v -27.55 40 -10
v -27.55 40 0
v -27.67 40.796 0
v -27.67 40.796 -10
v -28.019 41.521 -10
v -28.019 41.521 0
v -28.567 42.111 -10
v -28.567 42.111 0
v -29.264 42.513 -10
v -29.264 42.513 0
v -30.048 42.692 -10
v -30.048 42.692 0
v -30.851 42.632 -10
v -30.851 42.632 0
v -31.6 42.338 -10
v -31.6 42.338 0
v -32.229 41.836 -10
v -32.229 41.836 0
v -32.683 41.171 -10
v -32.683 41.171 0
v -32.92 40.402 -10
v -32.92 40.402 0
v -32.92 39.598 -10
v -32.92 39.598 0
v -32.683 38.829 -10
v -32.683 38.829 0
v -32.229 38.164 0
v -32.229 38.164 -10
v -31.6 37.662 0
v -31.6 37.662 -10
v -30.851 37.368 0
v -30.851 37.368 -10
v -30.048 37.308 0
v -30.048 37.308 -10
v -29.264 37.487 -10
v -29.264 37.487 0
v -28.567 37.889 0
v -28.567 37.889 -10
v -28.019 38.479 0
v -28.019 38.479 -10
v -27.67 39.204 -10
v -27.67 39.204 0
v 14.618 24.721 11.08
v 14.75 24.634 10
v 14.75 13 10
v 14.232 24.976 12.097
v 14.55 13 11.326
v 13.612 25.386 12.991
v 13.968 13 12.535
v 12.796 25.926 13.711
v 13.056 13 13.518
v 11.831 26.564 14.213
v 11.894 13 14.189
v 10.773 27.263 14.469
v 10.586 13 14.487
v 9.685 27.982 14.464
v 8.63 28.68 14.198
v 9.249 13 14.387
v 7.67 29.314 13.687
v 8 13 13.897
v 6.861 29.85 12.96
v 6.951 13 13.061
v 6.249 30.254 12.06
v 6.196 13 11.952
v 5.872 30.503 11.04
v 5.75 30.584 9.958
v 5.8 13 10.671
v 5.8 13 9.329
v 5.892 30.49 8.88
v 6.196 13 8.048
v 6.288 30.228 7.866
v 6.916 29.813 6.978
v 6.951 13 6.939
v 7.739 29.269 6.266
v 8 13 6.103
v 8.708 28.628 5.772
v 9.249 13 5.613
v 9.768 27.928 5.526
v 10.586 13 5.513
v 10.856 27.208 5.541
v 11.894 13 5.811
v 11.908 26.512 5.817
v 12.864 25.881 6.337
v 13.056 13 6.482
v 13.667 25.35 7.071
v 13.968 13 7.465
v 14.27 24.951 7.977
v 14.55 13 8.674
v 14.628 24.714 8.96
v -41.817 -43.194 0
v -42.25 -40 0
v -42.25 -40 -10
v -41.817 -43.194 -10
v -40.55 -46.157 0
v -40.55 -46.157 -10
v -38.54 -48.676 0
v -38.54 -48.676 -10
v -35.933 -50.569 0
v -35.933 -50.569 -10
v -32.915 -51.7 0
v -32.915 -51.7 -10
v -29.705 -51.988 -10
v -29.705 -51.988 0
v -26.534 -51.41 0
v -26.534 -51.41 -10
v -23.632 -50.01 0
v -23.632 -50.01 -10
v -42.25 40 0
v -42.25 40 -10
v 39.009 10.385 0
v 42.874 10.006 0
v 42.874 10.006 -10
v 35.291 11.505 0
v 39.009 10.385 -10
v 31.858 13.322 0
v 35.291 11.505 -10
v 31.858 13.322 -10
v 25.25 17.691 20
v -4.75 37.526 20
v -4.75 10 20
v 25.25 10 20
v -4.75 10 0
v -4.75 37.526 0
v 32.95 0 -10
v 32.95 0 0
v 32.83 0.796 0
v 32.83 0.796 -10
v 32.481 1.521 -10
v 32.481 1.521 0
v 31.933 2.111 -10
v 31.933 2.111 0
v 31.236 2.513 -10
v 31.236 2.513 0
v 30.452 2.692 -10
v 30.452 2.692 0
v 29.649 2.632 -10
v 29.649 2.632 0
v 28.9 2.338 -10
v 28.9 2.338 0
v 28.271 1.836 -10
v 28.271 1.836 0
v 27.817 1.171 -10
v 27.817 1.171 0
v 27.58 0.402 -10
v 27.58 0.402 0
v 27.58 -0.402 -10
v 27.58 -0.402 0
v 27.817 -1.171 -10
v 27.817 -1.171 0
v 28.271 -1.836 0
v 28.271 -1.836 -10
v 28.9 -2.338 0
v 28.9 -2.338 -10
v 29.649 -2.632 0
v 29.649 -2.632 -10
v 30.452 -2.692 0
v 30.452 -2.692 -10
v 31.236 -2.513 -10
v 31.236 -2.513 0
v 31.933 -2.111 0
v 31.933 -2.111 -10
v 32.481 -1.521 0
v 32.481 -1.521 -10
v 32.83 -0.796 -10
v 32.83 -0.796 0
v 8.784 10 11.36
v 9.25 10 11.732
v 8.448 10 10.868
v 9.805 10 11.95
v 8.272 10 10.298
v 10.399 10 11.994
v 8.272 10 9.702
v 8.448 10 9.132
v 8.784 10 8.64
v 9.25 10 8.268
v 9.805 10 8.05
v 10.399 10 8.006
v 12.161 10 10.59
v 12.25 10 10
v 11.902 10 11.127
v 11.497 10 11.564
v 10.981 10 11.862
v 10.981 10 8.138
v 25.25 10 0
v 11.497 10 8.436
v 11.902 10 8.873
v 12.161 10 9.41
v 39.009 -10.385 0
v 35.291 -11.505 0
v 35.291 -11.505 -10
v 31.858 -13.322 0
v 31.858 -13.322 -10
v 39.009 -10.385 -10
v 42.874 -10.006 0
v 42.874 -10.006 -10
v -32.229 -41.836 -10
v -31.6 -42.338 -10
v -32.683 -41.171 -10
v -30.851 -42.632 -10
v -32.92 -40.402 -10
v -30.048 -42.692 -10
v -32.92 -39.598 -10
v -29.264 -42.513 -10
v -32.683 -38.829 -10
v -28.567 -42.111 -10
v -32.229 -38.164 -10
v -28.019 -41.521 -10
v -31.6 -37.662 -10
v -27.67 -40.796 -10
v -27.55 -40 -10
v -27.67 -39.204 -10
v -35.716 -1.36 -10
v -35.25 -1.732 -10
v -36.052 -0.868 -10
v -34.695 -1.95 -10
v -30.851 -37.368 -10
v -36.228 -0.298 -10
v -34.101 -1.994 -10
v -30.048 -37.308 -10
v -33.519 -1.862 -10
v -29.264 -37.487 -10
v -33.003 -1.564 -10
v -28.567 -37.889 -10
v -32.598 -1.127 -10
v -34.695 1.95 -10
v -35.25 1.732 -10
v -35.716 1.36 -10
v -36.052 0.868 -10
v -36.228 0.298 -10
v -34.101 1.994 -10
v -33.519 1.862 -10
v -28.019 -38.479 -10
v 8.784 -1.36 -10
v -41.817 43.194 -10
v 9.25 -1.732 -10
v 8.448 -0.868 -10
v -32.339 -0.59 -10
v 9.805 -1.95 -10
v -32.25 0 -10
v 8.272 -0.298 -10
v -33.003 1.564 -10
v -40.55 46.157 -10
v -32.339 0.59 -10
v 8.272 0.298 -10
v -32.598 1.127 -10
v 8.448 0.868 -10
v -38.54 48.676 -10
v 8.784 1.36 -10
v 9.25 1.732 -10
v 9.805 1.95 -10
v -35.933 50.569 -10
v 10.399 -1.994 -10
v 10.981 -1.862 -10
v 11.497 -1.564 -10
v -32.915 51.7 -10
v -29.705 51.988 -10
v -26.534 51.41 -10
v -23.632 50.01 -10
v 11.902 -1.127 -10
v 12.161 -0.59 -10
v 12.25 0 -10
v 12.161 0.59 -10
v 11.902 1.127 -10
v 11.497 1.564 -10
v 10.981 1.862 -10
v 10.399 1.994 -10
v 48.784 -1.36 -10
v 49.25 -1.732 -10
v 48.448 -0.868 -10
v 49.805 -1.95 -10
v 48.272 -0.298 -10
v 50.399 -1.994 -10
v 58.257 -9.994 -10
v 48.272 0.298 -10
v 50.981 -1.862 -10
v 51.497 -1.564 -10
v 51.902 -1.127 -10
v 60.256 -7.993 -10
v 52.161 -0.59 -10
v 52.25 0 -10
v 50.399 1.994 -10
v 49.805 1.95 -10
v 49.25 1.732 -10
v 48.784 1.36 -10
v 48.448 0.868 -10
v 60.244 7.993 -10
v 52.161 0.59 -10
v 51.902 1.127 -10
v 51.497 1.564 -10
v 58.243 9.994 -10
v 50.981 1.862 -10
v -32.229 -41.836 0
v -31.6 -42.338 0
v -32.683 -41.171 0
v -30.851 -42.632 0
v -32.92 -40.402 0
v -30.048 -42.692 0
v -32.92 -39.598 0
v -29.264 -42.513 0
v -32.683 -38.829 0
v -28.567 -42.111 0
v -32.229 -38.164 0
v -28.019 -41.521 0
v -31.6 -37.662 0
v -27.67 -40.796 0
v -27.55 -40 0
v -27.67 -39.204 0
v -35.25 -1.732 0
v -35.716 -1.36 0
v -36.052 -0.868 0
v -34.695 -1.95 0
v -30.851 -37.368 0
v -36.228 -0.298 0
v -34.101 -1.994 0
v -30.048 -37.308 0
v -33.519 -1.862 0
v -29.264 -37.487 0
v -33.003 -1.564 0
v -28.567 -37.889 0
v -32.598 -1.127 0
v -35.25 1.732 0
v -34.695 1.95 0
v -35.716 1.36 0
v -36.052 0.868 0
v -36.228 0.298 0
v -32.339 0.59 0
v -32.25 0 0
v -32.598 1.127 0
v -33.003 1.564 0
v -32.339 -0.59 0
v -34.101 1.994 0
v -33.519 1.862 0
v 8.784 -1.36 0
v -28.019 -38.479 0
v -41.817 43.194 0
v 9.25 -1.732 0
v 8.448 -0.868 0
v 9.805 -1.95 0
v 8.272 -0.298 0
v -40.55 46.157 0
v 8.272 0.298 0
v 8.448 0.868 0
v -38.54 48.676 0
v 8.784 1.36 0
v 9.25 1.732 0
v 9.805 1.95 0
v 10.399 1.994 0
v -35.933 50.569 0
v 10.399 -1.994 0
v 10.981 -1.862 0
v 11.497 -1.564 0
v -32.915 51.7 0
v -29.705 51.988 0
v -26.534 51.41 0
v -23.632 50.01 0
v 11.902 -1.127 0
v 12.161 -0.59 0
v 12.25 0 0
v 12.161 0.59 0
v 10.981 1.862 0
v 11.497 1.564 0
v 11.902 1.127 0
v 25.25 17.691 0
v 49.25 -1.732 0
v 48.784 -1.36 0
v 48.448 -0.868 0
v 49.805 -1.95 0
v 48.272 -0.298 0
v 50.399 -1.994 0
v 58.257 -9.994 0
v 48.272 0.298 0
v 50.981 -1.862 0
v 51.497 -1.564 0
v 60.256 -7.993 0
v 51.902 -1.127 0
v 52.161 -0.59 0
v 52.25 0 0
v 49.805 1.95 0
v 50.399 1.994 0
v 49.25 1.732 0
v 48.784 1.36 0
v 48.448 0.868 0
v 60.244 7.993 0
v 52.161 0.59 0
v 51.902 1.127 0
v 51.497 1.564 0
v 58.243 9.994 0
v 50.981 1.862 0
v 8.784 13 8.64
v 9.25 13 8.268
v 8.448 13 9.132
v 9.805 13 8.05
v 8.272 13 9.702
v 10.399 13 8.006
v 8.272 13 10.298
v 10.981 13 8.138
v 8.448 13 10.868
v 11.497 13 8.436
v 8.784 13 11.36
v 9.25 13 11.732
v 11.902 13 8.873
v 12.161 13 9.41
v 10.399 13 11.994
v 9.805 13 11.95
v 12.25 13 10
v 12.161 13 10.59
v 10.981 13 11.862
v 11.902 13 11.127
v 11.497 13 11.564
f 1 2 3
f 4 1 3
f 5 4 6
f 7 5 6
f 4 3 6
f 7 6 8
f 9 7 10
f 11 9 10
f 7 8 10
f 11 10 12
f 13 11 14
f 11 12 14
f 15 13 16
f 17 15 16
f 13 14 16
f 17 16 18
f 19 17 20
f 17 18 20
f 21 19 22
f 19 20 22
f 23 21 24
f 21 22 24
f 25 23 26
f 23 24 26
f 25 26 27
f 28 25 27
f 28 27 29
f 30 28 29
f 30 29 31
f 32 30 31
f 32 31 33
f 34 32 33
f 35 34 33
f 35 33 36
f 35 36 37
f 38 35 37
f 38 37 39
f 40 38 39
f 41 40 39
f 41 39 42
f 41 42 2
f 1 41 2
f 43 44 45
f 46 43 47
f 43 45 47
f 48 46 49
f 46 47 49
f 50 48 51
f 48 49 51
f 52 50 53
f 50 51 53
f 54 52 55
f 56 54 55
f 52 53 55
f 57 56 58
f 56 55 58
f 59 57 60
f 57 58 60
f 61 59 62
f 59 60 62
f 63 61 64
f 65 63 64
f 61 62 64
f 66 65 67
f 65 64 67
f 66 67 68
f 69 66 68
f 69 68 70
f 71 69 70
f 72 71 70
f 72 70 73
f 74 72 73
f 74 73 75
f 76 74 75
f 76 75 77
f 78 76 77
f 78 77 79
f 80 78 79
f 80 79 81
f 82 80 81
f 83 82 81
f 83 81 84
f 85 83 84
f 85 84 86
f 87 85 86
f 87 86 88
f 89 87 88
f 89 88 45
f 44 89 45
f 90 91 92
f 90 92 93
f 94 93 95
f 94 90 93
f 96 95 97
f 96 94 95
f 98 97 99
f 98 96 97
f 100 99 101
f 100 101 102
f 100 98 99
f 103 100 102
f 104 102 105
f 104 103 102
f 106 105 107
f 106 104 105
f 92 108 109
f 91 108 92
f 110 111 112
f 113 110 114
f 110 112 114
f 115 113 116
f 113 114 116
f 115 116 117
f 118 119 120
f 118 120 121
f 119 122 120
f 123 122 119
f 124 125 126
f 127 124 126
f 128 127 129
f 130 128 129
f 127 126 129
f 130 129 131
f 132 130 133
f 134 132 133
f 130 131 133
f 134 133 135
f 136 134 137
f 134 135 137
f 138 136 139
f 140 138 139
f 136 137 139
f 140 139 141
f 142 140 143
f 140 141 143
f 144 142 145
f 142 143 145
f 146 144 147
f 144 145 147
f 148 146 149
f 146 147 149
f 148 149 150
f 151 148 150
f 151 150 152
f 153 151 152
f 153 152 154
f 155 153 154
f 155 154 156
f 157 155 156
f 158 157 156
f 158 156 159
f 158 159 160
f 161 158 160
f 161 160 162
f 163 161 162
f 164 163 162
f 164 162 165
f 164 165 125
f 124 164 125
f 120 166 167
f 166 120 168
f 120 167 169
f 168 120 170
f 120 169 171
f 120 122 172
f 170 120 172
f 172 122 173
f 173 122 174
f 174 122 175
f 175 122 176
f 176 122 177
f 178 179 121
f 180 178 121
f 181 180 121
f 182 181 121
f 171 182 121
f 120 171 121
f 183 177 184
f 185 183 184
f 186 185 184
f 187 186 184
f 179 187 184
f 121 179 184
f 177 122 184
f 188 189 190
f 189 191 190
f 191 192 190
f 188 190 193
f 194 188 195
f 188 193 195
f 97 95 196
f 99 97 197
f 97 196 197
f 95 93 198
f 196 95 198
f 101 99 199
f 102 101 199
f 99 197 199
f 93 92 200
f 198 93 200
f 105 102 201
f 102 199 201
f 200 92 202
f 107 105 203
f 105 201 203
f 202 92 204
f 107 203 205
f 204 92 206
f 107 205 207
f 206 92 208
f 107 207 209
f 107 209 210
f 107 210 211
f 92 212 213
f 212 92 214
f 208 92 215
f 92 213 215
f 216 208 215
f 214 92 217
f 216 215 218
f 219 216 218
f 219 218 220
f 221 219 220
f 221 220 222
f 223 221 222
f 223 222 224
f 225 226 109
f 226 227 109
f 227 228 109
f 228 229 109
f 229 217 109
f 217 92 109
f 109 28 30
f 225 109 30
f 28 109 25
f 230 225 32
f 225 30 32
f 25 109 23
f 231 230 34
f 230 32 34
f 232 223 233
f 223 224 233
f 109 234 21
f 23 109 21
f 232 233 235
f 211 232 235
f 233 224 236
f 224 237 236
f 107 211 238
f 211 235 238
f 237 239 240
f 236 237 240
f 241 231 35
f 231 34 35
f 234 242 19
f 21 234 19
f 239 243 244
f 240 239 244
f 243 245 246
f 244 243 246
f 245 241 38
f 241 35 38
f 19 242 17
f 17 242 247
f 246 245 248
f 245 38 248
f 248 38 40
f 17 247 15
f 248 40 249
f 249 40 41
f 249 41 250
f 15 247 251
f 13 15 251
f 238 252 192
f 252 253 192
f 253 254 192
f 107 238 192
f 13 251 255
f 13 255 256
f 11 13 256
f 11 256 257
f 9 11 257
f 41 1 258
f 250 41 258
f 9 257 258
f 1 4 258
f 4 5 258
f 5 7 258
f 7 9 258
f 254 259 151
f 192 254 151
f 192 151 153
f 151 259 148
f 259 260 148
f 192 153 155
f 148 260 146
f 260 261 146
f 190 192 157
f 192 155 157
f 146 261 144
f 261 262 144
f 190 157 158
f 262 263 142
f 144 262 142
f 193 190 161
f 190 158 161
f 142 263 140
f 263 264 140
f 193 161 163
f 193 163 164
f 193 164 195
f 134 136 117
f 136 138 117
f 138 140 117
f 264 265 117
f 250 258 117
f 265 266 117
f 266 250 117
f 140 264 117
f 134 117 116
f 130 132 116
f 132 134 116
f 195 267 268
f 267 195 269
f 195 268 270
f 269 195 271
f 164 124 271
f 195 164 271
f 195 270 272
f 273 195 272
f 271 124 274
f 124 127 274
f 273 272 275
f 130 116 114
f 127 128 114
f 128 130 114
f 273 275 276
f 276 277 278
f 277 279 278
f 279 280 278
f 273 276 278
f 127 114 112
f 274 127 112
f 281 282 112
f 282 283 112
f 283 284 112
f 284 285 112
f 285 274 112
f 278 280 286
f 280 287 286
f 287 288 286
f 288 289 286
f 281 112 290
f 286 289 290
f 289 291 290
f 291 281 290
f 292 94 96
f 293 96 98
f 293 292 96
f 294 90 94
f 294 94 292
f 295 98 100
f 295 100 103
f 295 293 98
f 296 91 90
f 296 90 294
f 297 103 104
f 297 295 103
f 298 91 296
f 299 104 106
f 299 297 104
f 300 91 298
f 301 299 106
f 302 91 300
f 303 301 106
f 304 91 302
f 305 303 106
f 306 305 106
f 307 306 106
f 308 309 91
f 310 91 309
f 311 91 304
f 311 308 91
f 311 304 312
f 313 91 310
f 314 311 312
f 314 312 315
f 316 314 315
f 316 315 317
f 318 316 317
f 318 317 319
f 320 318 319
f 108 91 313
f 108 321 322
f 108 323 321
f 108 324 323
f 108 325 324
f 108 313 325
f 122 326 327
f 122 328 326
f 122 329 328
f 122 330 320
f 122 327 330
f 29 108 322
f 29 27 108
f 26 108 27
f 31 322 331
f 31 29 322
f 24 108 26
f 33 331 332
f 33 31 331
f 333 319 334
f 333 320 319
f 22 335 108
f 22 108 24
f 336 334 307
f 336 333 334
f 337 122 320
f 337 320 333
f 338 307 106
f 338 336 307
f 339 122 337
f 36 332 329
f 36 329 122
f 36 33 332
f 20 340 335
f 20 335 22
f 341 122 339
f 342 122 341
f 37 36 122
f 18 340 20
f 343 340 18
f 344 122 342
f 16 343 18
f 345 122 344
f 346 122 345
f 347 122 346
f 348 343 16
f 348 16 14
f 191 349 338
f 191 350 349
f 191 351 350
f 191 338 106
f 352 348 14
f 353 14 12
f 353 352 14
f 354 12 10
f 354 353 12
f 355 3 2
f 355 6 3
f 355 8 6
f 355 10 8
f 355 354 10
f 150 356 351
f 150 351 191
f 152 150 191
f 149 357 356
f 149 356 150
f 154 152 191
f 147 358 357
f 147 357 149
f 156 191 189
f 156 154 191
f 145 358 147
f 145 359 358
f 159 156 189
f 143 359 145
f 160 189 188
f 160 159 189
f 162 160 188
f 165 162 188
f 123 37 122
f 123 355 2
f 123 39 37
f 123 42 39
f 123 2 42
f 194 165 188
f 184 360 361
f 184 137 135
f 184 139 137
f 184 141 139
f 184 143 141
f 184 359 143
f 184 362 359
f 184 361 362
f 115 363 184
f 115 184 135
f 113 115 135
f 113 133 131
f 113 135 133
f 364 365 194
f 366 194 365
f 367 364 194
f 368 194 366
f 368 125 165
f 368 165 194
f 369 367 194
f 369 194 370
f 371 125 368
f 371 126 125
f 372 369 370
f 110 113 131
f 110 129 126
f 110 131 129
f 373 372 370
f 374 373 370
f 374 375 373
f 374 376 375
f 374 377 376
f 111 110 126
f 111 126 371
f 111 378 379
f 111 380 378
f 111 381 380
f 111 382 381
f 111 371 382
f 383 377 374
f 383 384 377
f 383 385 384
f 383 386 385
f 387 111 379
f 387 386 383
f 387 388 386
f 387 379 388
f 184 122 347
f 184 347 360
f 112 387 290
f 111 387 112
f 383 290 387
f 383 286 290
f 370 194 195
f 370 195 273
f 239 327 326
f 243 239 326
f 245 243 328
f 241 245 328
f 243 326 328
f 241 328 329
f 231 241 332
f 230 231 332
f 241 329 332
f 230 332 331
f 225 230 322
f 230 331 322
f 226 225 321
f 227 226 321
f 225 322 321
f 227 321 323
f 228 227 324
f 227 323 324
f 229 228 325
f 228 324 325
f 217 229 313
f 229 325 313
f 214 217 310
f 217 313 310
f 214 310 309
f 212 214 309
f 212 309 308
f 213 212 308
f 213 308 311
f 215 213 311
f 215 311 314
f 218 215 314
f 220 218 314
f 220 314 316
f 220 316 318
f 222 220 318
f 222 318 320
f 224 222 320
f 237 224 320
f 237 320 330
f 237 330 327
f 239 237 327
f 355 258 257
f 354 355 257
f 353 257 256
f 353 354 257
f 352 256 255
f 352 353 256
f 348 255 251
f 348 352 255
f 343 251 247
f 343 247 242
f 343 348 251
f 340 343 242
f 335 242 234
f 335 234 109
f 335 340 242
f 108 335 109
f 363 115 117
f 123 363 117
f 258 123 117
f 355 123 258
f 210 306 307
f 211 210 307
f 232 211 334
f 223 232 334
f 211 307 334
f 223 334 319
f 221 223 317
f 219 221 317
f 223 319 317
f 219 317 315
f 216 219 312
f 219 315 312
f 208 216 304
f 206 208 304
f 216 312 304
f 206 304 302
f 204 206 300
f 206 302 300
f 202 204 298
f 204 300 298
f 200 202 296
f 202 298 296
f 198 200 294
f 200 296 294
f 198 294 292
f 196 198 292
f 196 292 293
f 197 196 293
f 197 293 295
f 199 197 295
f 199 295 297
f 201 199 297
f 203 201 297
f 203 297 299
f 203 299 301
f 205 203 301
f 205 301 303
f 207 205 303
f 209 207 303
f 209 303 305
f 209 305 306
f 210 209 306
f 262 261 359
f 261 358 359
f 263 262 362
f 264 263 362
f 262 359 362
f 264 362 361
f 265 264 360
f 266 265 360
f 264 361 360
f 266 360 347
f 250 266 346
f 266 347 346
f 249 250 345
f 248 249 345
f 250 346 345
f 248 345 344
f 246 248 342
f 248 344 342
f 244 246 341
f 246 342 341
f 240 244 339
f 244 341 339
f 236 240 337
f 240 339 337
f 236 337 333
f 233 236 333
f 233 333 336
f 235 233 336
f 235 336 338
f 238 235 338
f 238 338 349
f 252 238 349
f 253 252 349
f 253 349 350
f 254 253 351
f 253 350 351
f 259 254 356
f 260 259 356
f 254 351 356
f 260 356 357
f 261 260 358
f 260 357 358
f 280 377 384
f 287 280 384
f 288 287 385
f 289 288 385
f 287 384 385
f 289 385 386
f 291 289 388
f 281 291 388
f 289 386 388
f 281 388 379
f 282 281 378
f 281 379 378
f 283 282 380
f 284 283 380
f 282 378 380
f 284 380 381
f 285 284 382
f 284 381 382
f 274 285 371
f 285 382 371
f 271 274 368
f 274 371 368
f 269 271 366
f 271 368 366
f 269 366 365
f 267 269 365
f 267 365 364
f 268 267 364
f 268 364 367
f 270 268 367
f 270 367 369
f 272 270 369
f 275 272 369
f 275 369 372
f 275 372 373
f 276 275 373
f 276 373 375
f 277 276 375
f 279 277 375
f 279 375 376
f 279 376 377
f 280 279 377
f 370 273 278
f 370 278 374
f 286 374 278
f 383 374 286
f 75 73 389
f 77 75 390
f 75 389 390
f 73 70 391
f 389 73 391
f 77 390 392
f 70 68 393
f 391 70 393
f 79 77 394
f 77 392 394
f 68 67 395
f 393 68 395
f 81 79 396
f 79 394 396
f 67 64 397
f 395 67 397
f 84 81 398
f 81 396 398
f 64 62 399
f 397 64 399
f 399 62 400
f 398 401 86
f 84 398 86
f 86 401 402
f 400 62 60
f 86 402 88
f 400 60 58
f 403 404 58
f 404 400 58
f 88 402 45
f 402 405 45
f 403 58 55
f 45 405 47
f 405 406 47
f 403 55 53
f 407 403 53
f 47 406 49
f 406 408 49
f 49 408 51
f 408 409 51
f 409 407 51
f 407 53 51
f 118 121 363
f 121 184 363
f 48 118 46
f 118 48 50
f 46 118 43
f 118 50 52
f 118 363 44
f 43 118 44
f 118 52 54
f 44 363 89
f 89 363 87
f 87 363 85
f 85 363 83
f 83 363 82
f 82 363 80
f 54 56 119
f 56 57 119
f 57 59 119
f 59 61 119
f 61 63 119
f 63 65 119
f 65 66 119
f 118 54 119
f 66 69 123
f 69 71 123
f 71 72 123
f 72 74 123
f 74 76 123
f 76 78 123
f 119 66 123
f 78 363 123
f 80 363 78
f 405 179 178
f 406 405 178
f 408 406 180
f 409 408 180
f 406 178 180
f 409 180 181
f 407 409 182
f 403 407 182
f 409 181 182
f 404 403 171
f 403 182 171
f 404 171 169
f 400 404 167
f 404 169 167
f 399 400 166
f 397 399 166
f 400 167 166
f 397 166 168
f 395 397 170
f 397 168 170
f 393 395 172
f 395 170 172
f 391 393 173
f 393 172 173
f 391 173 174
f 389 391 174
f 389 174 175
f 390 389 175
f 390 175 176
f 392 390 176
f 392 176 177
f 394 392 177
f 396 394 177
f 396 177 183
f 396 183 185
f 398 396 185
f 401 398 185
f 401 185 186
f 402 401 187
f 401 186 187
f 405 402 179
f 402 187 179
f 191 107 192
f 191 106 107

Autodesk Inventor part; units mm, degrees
ref_plane "YZ Plane" through (0, 0, 0) normal (1, 0, 0) x (0, 1, 0)
ref_plane "XZ Plane" through (0, 0, 0) normal (0, 1, 0) x (-1, 0, 0)
ref_plane "XY Plane" through (0, 0, 0) normal (0, 0, 1) x (1, 0, 0)
sketch "Sketch1" plane through (0, 0, 0) normal (0, 0, 1) x (1, 0, 0)
  line L0 (0, 0) -> (30.25, 0) construction
  line L1 (0, 0) -> (-30.25, 0) construction
  line L2 (-30.25, 0) -> (-30.25, 40) construction
  line L3 (-30.25, 0) -> (-30.25, -40) construction
  circle A0 centre (-30.25, 40) radius 2.7
  circle A1 centre (-30.25, -40) radius 2.7
  circle A2 centre (30.25, 0) radius 2.7
  circle A3 centre (-30.25, 40) radius 12
  circle A4 centre (-30.25, -40) radius 12
  circle A5 centre (30.25, 0) radius 12
  line L4 (36.868172, -10.009985) -> (-23.631828, -50.009985)
  line L5 (-42.25, 40) -> (-42.25, -40)
  circle A6 centre (-34.25, 0) radius 2
  line L6 (-30.25, 0) -> (-34.25, 0) construction
  line L7 (-23.631828, 50.009985) -> (36.868172, 10.009985)
  line L8 (30.25, 0) -> (50.25, 0) construction
  circle A7 centre (50.25, 0) radius 10
  circle A8 centre (50.25, 0) radius 2
  line L9 (50.25746, 9.999997) -> (36.868172, 10.009985)
  line L10 (50.25746, -9.999997) -> (36.868172, -10.009985)
  circle A9 centre (10.25, 0) radius 2
  line L11 (50.25746, -9.999997) -> (60.257457, -9.992538)
  line L12 (60.257457, -9.992538) -> (60.242549, 9.992549)
  line L13 (60.242549, 9.992549) -> (50.25746, 9.999997)
  point P0 (-42.25, 0)
  point P1 (41.35, -4.559605)
  point P2 (41.35, 4.559605)
  point P3 (60.249997, 0.00746)
  dimension "d0" = 60.5
  dimension "d1" = 5.4
  dimension "d2" = 80
  dimension "d3" = 24
  dimension "d55" = 4
  dimension "d56" = 8
  dimension "d57" = 20
  dimension "d58" = 20
  dimension "d69" = 20
sketch "Sketch1 outline for Extrusion1" plane through (0, 0, 0) normal (0, 0, 1) x (1, 0, 0)
  arc A0 (-23.631828, 50.009985) -> (-42.25, 40) centre (-30.25, 40) ccw
  line L0 (-42.25, 40) -> (-42.25, -40)
  arc A1 (-42.25, -40) -> (-23.631828, -50.009985) centre (-30.25, -40) ccw
  line L1 (-23.631828, -50.009985) -> (36.868172, -10.009985)
  line L2 (36.868172, -10.009985) -> (60.257457, -9.992538)
  line L3 (60.257457, -9.992538) -> (60.242549, 9.992549)
  line L4 (60.242549, 9.992549) -> (36.868172, 10.009985)
  line L5 (36.868172, 10.009985) -> (-23.631828, 50.009985)
  circle A2 centre (-30.25, 40) radius 2.7
  circle A3 centre (10.25, 0) radius 2
  circle A4 centre (-34.25, 0) radius 2
  circle A5 centre (30.25, 0) radius 2.7
  circle A6 centre (-30.25, -40) radius 2.7
  circle A7 centre (50.25, 0) radius 2
extrude "Extrusion1" add sketch "Sketch1 outline for Extrusion1" against normal blind 10
fillet "Fillet1" radius 20 2 edges at (36.8682, 10.01, -5) (36.8682, -10.01, -5)
sketch "Sketch5" plane through (0, 0, 0) normal (0, 0, 1) x (1, 0, 0)
  arc A0 (-42.25, -40) -> (-23.631828, -50.009985) centre (-30.25, -40) ccw
  line L0 (-23.631828, -50.009985) -> (31.85846, -13.322191)
  arc A1 (42.873828, -10.005505) -> (31.85846, -13.322191) centre (42.888747, -30.0055) ccw
  line L1 (42.873828, -10.005505) -> (60.257457, -9.992538)
  arc A2 (31.85846, 13.322191) -> (42.873828, 10.005505) centre (42.888747, 30.0055) ccw
  line L2 (31.85846, 13.322191) -> (-23.631828, 50.009985)
  arc A3 (-23.631828, 50.009985) -> (-42.25, 40) centre (-30.25, 40) ccw
  line L3 (-42.25, 40) -> (-42.25, -40)
  circle A4 centre (-30.25, -40) radius 2.7
  circle A5 centre (30.25, 0) radius 2.7
  circle A6 centre (-34.25, 0) radius 2
  circle A7 centre (-30.25, 40) radius 2.7
  circle A8 centre (50.25, 0) radius 2
  line L4 (-4.75, 10) -> (-4.75, 37.526132)
  line L5 (-4.75, 10) -> (25.25, 10)
  line L6 (25.25, 10) -> (25.25, 17.691421)
  line L7 (60.257457, -9.992538) -> (60.242549, 9.992549)
  line L8 (60.242549, 9.992549) -> (42.873828, 10.005505)
  point P0 (10.267224, 24.242705)
  point P1 (8.658764, 37.564896)
  dimension "d64" = 10
  dimension "d65" = 5
  dimension "d66" = 30
extrude "Extrusion6" add sketch "Sketch5" along normal blind 20 contours L2 L6 L5 L4
sketch "Sketch6" plane through (-4.75, 10, 0) normal (0, -1, 0) x (1, 0, 0)
  line L0 (30, 0) -> (30, 20) projected
  line L1 (0, 20) -> (30, 20) projected
  line L2 (0, 0) -> (0, 20) projected
  line L3 (13, 0) -> (17, 0) projected
  line L4 (15, 0) -> (15, 10) construction
  circle A0 centre (15, 10) radius 2
  point P0 (4.75, 0)
  dimension "d70" = 10
  dimension "d71" = 4
ref_plane "Work Plane1" through (-4.75, 13, 0) normal (0, -1, 0) x (1, 0, 0)
extrude "Extrusion7" cut sketch "Sketch6" against normal through all
sketch "Sketch7" plane through (-4.75, 13, 0) normal (0, -1, 0) x (1, 0, 0)
  circle A0 centre (15, 10) radius 2 projected
  circle A1 centre (15, 10) radius 4.5
  point P0 (4.75, 0)
  dimension "d75" = 9
extrude "Extrusion8" cut sketch "Sketch7" against normal through all
chamfer "Chamfer6" distance 2 angle 45 2 edges at (60.2425, 9.9925, -5) (60.2575, -9.9925, -5)
equation "\"b\" = 2"
properties part number "y axis something back_3DPrint"
